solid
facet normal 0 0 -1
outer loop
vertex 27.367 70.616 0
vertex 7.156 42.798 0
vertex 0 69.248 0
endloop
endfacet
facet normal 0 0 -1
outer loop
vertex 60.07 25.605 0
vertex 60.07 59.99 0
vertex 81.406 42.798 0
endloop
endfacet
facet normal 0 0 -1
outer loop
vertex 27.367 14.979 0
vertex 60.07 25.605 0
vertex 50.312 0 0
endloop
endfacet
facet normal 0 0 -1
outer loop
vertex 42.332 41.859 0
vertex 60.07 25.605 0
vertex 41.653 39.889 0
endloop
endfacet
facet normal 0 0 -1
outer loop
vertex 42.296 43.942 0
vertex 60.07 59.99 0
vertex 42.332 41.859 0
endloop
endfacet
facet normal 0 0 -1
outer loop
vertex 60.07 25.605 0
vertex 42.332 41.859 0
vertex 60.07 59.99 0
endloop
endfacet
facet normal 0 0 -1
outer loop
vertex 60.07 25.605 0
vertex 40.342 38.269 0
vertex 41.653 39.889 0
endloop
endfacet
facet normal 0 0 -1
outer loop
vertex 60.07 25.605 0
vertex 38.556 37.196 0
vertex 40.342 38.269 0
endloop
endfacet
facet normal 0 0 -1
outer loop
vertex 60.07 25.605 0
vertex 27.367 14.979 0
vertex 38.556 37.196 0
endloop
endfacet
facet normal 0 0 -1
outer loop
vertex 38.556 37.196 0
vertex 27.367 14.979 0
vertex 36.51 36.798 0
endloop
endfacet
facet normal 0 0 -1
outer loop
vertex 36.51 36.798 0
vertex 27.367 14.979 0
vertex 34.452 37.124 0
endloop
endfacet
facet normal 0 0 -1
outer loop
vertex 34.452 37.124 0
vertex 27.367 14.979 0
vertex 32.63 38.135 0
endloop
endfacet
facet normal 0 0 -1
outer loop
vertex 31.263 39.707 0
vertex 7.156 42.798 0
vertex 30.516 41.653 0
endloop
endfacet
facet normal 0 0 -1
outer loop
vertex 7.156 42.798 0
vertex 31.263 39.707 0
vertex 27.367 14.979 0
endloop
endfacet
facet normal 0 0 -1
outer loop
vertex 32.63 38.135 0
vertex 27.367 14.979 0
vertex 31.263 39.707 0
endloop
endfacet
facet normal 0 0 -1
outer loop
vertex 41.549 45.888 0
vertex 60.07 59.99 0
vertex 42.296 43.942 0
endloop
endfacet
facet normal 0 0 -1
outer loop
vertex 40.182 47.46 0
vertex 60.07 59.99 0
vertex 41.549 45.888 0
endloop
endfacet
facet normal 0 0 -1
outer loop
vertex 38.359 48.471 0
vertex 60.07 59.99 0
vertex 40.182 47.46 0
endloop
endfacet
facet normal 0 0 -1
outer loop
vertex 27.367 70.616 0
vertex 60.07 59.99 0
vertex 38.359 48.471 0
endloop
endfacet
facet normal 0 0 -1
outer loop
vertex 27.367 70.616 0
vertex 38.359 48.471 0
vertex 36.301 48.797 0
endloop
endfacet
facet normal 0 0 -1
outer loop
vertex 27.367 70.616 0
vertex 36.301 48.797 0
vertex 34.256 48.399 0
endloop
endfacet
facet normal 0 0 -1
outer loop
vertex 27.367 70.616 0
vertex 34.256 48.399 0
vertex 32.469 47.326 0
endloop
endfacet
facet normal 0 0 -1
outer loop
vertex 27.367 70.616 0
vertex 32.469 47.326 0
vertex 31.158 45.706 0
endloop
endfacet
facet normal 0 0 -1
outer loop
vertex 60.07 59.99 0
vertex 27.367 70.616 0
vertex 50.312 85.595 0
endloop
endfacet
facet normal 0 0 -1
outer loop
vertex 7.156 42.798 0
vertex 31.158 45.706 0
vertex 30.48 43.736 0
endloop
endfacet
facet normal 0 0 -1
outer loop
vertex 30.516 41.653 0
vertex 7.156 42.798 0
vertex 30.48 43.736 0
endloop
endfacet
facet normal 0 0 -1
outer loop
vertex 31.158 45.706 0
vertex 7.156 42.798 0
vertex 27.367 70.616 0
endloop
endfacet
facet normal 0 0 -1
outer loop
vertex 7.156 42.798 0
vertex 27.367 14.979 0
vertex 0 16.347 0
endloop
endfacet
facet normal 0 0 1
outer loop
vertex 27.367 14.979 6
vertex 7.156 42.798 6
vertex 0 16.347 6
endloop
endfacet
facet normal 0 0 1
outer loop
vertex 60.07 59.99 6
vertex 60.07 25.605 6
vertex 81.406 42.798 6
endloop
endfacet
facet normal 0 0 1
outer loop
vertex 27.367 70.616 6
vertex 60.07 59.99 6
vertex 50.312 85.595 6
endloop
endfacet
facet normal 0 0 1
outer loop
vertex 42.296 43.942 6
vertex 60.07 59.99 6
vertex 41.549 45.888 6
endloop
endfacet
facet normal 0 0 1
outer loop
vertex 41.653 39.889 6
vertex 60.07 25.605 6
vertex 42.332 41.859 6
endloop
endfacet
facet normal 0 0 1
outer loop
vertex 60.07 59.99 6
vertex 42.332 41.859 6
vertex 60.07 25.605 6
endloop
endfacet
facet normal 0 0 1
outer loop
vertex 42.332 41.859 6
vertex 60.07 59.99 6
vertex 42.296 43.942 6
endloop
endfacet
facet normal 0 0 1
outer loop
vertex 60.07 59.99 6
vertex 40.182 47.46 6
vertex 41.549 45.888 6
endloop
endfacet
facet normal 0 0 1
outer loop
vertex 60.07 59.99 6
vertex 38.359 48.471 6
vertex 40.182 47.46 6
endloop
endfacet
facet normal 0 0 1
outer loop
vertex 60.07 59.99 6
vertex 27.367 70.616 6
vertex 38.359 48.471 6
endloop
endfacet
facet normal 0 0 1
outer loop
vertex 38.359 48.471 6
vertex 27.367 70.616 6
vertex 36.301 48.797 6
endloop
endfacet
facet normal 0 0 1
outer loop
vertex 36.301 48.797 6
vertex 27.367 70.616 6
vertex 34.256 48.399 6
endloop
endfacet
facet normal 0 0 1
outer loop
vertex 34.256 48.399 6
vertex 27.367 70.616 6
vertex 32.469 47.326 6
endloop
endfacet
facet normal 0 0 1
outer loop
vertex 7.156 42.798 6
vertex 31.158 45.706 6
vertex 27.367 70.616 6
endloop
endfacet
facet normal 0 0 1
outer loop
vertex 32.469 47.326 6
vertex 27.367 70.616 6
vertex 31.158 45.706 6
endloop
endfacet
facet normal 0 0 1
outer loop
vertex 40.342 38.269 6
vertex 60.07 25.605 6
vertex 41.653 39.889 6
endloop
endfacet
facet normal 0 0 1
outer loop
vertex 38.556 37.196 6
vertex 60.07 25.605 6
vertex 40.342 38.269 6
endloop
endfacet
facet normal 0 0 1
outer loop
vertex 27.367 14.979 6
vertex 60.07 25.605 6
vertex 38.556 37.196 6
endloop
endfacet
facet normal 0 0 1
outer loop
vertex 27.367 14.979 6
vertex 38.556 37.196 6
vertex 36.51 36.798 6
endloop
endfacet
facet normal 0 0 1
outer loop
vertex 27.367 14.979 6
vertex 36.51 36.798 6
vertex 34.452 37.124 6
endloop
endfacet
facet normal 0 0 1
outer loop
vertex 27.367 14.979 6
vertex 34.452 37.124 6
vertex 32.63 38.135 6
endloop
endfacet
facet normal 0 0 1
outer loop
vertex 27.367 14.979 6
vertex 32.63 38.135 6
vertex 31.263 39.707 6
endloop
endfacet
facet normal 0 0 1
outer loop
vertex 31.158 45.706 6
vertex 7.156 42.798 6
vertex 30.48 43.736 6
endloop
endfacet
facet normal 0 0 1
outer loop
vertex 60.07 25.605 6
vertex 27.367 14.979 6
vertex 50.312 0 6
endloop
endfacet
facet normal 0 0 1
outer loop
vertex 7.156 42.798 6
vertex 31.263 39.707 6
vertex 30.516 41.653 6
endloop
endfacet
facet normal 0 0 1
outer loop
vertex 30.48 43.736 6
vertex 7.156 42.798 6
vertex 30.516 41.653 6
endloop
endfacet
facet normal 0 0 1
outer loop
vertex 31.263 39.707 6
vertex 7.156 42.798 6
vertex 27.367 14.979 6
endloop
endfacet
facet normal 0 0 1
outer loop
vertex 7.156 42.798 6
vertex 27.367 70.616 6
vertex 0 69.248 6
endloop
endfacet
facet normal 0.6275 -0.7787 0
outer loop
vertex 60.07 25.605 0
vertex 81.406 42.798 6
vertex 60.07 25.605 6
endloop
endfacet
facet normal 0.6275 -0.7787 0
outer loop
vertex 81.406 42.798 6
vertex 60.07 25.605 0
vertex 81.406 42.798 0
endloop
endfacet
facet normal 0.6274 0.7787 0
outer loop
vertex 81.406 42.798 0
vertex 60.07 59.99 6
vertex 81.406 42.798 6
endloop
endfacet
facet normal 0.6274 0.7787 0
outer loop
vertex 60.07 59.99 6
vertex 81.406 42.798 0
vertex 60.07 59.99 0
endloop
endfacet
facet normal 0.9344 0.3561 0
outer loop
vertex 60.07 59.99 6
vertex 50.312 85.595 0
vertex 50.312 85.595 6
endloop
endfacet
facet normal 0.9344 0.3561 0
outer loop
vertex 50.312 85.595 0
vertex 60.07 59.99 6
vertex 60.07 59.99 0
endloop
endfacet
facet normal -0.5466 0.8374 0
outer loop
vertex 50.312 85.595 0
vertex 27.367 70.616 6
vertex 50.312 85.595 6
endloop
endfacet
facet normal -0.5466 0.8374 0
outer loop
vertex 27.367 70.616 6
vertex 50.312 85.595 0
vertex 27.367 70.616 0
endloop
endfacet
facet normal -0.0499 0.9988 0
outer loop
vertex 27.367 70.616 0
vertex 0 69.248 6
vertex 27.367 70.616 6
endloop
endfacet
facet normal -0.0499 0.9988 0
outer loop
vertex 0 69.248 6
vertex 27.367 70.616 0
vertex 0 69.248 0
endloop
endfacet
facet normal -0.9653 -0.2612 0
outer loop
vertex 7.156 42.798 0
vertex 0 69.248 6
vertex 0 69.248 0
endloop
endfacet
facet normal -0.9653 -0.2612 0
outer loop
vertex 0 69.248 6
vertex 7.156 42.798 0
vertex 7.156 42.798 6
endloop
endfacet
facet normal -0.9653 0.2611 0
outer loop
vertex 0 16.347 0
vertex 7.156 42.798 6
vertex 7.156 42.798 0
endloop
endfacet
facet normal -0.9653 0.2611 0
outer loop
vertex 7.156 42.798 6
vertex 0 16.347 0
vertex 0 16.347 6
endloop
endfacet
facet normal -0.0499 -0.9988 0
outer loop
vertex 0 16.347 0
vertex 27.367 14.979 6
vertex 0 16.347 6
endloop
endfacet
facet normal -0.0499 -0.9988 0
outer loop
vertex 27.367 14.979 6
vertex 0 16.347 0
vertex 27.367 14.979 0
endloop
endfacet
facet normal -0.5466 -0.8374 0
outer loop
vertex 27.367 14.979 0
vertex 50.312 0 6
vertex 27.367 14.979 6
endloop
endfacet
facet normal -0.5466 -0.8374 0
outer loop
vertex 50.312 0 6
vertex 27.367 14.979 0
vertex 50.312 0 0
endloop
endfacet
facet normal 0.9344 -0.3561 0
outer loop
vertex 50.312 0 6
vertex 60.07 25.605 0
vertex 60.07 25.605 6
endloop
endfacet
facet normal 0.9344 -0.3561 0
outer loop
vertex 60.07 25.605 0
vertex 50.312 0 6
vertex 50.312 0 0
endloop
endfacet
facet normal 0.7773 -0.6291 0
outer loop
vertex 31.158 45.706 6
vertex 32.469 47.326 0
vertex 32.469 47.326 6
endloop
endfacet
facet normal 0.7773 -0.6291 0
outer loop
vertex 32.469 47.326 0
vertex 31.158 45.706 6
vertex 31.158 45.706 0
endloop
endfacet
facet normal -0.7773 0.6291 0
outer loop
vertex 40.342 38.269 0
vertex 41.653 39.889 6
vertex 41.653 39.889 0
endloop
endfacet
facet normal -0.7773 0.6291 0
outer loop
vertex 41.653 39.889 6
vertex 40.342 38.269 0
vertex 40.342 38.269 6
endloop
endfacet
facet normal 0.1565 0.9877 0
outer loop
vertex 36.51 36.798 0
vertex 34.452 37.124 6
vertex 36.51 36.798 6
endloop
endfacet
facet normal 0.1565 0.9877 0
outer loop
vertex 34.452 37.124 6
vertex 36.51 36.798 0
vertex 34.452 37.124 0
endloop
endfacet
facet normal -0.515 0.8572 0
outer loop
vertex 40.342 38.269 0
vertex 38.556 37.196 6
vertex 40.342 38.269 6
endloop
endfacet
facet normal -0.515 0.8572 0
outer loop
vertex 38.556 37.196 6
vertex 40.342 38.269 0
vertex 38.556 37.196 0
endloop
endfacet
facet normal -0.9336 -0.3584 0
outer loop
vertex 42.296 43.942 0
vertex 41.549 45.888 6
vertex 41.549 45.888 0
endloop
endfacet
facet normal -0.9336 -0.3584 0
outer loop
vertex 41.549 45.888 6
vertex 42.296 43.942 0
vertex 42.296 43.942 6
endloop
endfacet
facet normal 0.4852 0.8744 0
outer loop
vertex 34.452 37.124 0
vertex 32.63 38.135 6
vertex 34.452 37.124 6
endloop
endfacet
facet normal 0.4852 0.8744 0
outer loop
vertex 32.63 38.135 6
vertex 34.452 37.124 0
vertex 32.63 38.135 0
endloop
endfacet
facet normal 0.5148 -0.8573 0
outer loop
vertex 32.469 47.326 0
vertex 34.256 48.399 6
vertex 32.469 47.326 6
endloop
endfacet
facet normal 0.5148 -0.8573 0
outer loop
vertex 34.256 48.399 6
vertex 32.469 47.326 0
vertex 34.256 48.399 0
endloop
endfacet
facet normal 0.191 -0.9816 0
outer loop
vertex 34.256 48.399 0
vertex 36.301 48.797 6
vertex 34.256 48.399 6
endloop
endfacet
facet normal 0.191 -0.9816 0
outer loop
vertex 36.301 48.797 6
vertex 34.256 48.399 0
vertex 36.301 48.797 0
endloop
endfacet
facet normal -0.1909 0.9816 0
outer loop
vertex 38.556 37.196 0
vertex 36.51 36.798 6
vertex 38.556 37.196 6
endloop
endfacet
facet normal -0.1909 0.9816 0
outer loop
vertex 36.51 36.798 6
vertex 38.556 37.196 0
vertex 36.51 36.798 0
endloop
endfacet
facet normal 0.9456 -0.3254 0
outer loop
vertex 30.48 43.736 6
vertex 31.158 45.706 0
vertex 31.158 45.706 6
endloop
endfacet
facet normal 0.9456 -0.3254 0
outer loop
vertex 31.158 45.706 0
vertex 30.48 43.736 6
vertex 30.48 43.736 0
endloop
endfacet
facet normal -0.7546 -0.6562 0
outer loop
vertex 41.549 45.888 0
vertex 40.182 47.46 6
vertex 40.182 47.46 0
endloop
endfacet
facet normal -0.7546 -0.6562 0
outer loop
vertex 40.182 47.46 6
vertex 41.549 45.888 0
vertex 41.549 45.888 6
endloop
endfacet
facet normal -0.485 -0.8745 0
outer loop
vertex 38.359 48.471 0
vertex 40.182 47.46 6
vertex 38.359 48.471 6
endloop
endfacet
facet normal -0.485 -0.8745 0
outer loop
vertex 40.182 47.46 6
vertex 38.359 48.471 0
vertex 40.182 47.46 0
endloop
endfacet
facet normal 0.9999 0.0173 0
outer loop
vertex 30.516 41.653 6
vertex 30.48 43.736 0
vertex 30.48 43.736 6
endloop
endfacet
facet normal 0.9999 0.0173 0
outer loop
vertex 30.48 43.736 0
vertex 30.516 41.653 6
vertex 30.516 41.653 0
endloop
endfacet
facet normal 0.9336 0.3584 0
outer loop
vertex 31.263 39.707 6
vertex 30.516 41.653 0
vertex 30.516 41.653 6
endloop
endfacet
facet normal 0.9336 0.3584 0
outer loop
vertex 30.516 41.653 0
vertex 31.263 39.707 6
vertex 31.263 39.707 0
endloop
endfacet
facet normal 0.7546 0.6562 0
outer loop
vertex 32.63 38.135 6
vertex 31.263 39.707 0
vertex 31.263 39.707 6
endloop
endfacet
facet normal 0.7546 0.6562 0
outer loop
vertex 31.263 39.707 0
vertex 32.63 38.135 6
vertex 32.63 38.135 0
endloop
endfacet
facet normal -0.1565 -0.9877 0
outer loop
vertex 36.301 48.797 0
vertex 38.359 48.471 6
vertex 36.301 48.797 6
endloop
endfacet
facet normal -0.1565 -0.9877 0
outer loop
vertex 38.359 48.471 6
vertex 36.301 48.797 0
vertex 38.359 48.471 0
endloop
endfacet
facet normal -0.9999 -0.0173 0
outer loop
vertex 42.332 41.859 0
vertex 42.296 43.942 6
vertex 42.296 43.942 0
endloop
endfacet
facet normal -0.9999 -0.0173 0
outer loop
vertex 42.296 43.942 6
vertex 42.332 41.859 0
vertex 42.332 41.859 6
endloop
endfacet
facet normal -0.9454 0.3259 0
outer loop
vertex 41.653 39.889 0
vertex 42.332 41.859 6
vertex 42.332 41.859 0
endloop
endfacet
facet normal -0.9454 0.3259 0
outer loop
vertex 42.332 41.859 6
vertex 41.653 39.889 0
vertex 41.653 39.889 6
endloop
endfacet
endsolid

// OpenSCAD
$fn = 32;

// ----------------------------------------------------------------------
// Star wheel: 5-point blunt, R45
// ----------------------------------------------------------------------

// --- parameters (mm) ---
n_points = 5;             // number of points / teeth
r_out = 45;               // tip radius
r_in = 29.25;             // root radius
bore_r = 6;               // centre bore radius
plate_t = 6;              // plate thickness, Z (extrusion height)
bore_d = 12;              // centre bore diameter

profile = [[81.406, 42.798], [60.07, 59.99], [50.312, 85.595], [27.367, 70.616], [0, 69.248], [7.156, 42.798], [0, 16.347], [27.367, 14.979], [50.312, 0], [60.07, 25.605]];  // primary outline, 10 points, counter clockwise
void_1 = [[42.296, 43.942], [41.549, 45.888], [40.182, 47.46], [38.359, 48.471], [36.301, 48.797], [34.256, 48.399], [32.469, 47.326], [31.158, 45.706], [30.48, 43.736], [30.516, 41.653], [31.263, 39.707], [32.63, 38.135], [34.452, 37.124], [36.51, 36.798], [38.556, 37.196], [40.342, 38.269], [41.653, 39.889], [42.332, 41.859]];  // centre bore, 18 points

// --- the one profile operation ---
difference() {
  linear_extrude(height = plate_t) polygon(points = profile);
  translate([0, 0, -1])
    linear_extrude(height = plate_t + 2) polygon(points = void_1);
}
